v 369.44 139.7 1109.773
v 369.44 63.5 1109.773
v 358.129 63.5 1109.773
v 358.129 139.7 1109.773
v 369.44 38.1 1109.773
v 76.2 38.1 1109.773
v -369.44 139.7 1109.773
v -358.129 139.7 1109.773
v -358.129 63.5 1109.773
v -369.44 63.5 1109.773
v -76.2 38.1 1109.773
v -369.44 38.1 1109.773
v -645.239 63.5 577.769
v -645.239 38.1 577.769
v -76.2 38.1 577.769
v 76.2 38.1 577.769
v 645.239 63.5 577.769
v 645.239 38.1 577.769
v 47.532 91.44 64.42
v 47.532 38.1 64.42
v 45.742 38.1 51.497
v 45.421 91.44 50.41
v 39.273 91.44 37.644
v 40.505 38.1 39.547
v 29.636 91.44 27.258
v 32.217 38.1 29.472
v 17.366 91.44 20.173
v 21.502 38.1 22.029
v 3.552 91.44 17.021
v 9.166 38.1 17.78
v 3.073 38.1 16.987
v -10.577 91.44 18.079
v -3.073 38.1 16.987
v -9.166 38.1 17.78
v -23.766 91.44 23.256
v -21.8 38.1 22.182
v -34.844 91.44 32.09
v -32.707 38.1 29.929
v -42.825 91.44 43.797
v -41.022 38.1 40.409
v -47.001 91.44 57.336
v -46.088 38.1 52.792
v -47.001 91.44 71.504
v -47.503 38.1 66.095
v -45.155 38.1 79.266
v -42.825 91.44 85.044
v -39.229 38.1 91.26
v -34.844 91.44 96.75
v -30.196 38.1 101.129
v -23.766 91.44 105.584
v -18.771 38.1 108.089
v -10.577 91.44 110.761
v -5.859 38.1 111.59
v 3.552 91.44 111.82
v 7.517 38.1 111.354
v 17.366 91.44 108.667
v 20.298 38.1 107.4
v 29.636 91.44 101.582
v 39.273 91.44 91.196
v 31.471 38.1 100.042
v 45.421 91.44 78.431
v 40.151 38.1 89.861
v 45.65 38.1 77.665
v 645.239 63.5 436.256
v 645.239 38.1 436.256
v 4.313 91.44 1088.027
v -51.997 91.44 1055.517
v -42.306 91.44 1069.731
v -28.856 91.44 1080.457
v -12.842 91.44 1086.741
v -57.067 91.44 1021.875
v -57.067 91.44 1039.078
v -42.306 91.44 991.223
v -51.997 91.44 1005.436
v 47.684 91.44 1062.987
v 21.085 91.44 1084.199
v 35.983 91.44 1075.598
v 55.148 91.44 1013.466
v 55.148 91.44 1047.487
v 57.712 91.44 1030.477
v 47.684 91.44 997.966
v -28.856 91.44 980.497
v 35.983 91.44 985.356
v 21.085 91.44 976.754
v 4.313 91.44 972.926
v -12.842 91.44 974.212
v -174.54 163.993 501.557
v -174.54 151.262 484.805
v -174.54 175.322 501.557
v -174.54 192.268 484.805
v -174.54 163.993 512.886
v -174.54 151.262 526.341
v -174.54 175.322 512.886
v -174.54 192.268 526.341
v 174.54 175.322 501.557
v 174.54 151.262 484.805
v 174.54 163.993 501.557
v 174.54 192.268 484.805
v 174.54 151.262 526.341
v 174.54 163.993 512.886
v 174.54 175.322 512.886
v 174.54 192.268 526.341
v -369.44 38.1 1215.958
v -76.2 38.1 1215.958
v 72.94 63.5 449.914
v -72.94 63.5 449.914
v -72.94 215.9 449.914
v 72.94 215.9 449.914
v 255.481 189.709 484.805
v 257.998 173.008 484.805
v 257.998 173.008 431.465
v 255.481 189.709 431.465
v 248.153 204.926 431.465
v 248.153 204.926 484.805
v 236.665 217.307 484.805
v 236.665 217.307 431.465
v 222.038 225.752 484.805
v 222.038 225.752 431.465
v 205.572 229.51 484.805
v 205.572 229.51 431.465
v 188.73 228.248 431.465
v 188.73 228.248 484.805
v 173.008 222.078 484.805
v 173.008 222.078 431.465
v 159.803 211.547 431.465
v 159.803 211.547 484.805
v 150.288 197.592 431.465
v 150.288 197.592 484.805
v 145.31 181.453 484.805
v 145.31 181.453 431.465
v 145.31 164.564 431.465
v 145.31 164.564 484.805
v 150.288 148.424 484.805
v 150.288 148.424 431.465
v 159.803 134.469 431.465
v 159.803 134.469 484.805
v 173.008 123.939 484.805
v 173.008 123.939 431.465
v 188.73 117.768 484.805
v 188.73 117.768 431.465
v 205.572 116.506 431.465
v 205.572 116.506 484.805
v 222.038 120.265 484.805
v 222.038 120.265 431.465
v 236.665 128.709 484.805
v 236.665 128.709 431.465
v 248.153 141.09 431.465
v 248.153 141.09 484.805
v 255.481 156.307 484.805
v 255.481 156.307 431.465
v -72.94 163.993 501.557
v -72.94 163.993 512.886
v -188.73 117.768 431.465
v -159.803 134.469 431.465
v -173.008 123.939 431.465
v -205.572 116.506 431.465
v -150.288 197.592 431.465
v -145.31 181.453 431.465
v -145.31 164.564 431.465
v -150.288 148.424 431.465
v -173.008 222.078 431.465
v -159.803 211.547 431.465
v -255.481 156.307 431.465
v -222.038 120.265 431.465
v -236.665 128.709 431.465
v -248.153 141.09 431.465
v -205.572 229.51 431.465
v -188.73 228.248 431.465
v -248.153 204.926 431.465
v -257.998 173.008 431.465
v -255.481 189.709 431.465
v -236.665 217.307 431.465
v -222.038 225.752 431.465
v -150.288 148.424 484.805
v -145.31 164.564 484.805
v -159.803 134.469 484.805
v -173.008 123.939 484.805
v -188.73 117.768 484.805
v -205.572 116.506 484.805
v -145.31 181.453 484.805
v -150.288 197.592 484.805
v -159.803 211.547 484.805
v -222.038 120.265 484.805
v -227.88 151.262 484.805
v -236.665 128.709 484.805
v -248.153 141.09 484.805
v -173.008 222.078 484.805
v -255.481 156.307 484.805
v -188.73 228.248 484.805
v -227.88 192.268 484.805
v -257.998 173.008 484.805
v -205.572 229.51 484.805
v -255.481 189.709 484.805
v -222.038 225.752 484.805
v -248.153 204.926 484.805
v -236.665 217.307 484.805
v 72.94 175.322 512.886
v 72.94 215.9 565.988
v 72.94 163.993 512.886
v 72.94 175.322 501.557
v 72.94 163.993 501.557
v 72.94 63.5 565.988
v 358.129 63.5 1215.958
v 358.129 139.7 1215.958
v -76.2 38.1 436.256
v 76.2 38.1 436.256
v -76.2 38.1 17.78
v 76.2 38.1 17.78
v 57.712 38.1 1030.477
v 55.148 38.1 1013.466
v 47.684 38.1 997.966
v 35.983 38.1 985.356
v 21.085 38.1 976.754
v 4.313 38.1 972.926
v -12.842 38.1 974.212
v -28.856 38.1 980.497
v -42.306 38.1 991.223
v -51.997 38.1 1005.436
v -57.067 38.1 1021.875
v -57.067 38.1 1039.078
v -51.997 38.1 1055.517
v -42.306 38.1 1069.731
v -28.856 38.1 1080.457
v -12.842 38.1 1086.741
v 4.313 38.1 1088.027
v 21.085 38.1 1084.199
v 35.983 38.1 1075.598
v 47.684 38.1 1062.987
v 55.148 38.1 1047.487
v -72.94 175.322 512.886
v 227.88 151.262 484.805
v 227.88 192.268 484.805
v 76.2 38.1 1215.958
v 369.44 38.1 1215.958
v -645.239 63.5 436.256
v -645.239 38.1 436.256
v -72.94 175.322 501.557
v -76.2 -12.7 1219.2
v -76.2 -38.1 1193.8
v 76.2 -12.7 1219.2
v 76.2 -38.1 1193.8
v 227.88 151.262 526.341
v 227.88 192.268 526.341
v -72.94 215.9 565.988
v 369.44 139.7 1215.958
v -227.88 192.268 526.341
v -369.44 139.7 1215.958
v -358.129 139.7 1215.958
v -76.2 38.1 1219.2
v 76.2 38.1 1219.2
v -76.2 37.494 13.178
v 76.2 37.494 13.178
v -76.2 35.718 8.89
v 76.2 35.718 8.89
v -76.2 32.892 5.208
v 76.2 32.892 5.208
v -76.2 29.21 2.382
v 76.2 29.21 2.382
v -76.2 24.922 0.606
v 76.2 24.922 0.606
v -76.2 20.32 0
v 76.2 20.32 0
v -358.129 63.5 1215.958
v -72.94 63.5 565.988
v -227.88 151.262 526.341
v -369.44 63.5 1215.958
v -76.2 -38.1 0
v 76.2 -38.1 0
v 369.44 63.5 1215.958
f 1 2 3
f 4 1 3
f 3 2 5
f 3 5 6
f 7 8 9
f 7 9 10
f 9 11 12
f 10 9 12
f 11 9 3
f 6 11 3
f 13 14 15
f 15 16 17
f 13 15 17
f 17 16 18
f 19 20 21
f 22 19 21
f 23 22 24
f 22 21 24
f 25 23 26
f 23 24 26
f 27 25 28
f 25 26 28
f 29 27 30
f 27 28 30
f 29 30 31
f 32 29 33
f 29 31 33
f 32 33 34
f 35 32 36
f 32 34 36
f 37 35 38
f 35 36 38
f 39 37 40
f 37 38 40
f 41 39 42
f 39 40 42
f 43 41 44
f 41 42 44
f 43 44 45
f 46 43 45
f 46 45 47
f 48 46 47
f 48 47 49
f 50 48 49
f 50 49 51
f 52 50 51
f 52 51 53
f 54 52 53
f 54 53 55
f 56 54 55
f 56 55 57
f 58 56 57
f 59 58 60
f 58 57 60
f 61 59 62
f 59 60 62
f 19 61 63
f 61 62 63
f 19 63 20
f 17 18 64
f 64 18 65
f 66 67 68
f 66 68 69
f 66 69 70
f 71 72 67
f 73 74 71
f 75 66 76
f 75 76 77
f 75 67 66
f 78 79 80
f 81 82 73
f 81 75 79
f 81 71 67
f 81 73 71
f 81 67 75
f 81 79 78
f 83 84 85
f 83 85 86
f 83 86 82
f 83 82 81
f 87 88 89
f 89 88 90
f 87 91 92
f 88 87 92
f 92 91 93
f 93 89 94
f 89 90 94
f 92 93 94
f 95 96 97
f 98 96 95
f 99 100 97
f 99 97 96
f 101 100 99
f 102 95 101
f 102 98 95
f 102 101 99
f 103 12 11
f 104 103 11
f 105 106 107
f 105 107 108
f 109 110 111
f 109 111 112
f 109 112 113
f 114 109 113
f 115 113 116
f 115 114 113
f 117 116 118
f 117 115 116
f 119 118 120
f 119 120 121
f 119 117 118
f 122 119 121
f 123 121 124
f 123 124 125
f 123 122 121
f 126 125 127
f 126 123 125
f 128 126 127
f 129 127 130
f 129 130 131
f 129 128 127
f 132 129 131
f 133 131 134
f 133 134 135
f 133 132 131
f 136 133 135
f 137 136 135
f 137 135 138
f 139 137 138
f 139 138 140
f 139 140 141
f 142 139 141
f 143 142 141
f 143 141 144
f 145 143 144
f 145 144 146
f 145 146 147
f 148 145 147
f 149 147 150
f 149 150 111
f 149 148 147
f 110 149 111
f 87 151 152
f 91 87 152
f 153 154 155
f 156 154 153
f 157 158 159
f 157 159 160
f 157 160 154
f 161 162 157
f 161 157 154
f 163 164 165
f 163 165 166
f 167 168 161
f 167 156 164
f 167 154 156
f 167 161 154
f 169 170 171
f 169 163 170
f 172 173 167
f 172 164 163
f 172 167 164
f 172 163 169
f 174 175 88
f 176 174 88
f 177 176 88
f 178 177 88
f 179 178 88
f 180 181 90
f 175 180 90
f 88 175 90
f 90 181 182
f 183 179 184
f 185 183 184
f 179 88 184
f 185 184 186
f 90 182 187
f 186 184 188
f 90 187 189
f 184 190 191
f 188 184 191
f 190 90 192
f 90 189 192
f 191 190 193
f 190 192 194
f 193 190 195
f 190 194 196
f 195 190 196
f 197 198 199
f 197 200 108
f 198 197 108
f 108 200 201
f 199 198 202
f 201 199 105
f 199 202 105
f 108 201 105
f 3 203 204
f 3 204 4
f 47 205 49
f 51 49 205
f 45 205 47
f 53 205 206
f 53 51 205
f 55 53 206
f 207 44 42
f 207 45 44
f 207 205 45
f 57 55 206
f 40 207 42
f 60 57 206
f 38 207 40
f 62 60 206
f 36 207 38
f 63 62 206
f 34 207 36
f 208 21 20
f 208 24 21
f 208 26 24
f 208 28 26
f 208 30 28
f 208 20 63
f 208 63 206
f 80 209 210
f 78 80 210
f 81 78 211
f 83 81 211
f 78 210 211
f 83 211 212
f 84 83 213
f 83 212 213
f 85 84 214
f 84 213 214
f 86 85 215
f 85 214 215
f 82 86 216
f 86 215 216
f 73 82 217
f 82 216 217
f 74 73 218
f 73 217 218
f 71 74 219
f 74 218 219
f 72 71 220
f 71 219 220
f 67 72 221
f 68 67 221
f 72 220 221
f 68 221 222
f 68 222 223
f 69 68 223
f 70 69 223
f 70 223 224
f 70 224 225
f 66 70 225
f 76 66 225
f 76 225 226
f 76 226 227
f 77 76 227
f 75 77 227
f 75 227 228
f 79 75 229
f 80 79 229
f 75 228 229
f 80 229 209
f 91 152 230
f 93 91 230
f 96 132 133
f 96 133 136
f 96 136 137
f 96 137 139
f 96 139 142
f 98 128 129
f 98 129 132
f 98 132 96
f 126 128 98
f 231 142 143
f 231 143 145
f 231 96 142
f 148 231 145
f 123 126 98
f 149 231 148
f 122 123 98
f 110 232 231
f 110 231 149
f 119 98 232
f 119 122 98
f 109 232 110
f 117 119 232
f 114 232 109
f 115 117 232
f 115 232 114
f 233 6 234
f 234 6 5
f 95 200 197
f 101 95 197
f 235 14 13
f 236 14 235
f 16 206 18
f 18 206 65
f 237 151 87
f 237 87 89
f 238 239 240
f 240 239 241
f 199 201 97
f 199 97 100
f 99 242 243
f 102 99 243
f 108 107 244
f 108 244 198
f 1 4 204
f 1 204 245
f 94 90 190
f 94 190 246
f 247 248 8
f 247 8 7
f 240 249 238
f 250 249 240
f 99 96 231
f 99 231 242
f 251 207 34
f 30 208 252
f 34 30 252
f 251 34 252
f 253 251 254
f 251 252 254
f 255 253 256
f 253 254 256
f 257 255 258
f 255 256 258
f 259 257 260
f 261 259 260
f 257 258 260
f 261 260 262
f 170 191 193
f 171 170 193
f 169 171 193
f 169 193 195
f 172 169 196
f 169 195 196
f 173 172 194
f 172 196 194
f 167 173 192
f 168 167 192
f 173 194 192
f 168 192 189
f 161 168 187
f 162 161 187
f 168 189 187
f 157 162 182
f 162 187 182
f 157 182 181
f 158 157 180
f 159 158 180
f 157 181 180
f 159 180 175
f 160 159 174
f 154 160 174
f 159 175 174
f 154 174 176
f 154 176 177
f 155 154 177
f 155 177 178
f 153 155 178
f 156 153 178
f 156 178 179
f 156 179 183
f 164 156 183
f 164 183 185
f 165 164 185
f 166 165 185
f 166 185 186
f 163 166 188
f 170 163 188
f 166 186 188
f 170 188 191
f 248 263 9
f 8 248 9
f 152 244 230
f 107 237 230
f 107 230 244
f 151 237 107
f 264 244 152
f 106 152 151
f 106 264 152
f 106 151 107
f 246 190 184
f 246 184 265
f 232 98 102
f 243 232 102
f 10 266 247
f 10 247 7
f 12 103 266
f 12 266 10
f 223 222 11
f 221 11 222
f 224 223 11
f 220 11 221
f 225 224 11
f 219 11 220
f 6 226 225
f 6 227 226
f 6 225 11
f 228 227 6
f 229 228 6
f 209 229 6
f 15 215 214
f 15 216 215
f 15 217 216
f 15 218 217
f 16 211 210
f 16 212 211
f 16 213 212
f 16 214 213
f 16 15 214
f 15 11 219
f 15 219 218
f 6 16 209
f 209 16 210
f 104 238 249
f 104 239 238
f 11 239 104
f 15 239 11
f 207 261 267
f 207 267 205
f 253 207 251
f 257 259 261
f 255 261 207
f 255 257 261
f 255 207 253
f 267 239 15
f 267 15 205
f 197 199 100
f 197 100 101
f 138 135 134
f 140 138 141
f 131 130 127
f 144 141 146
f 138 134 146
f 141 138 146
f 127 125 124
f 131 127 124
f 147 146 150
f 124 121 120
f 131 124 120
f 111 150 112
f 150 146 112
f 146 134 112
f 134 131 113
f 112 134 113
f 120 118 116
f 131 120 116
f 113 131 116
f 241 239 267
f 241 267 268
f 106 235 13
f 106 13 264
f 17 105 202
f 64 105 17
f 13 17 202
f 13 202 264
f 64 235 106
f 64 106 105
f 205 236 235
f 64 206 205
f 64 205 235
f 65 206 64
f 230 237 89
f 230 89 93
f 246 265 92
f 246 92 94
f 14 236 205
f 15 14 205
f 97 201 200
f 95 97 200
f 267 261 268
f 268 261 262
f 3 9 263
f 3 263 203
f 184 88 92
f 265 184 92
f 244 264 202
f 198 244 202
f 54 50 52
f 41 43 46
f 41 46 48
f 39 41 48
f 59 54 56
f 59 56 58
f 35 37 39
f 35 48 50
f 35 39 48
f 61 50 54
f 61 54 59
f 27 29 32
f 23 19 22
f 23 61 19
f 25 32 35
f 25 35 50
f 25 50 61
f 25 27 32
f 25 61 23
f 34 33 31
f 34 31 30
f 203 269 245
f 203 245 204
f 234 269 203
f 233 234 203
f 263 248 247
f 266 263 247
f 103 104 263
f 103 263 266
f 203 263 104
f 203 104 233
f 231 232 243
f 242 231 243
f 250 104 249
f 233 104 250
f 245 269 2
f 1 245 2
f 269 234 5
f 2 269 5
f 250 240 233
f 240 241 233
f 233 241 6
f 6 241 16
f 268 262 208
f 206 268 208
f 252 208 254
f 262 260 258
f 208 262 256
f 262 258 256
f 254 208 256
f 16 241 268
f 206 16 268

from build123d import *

# Parameters (mm, degrees)
SKETCH1_W           = 152.4
SKETCH1_H           = 76.2
BOSS_EXTRUDE1_DEPTH = 1219.2
FILLET1_R           = 17.78
CHAMFER1_SIZE       = 25.4
SKETCH2_W           = 1290.477589614
SKETCH2_H           = 141.513172698
SKETCH2_W_2         = 738.880843562
SKETCH2_H_2         = 106.185211378
BOSS_EXTRUDE2_DEPTH = 25.4
SKETCH3_W           = 145.88030373
SKETCH3_H           = 116.073932347
BOSS_EXTRUDE3_DEPTH = 152.4
SKETCH4_W           = 11.32867816
SKETCH4_H           = 11.32867816
BOSS_EXTRUDE4_DEPTH = 101.6
SKETCH5_W           = 41.535496856
SKETCH5_H           = 41.006382246
BOSS_EXTRUDE5_DEPTH = 53.34
SKETCH6_R           = 56.660477504
BOSS_EXTRUDE6_DEPTH = 53.34
SKETCH7_R           = 47.532369055
SKETCH7_R_2         = 57.711896929
BOSS_EXTRUDE7_DEPTH = 53.34
SKETCH8_W           = 11.310933435
SKETCH8_H           = 106.185211378
BOSS_EXTRUDE8_DEPTH = 76.2


with BuildPart() as part:
    # Sketch1 → Boss-Extrude1 (new body)
    with BuildSketch(Plane.XY):
        Rectangle(SKETCH1_W, SKETCH1_H)
    extrude(amount=BOSS_EXTRUDE1_DEPTH)

    # Fillet1
    fillet1_edges = [part.edges().sort_by_distance(p)[0] for p in [
        (0, 38.1, 0),
    ]]
    fillet(fillet1_edges, radius=FILLET1_R)

    # Chamfer1
    chamfer1_edges = [part.edges().sort_by_distance(p)[0] for p in [
        (0, -38.1, 1219.2),
    ]]
    chamfer(chamfer1_edges, length=CHAMFER1_SIZE)

    # Sketch2 → Boss-Extrude2 (add)
    with BuildSketch(Plane(origin=(0, 38.1, 0), x_dir=(1, 0, 0), z_dir=(0, 1, 0))):
        with Locations((0, -507.012478725)):
            Rectangle(SKETCH2_W, SKETCH2_H)
        with Locations((0, -1162.865725204)):
            Rectangle(SKETCH2_W_2, SKETCH2_H_2)
    extrude(amount=BOSS_EXTRUDE2_DEPTH)

    # Sketch3 → Boss-Extrude3 (add)
    with BuildSketch(Plane(origin=(0, 63.5, 0), x_dir=(1, 0, 0), z_dir=(0, 1, 0))):
        with Locations((0, -507.950753796)):
            Rectangle(SKETCH3_W, SKETCH3_H)
    extrude(amount=BOSS_EXTRUDE3_DEPTH)

    # Sketch4 → Boss-Extrude4 (add)
    with BuildSketch(Plane.ZY.offset(72.940151865)):
        with Locations((507.221293342, 169.657361137)):
            Rectangle(SKETCH4_W, SKETCH4_H)
    boss_extrude4 = extrude(amount=BOSS_EXTRUDE4_DEPTH)

    # Sketch5 → Boss-Extrude5 (add)
    with BuildSketch(Plane.ZY.offset(174.540151865)):
        with Locations((505.573109598, 171.765287406)):
            Rectangle(SKETCH5_W, SKETCH5_H)
    boss_extrude5 = extrude(amount=BOSS_EXTRUDE5_DEPTH)

    # Sketch6 → Boss-Extrude6 (add)
    with BuildSketch(Plane(origin=(0, 0, 484.80536117), x_dir=(-1, 0, 0), z_dir=(0, 0, -1))):
        with Locations((201.337814598, 173.008334857)):
            Circle(SKETCH6_R)
    boss_extrude6 = extrude(amount=BOSS_EXTRUDE6_DEPTH)

    # Mirror1: Boss-Extrude4, Boss-Extrude5, Boss-Extrude6 across plane
    add(boss_extrude4.mirror(Plane(origin=(0, 0, 0), x_dir=(0, 0, 1), z_dir=(1, 0, 0))))
    add(boss_extrude5.mirror(Plane(origin=(0, 0, 0), x_dir=(0, 0, 1), z_dir=(1, 0, 0))))
    add(boss_extrude6.mirror(Plane(origin=(0, 0, 0), x_dir=(0, 0, 1), z_dir=(1, 0, 0))))

    # Sketch7 → Boss-Extrude7 (add)
    with BuildSketch(Plane(origin=(0, 38.1, 0), x_dir=(1, 0, 0), z_dir=(0, 1, 0))):
        with Locations((0, -64.420131153)):
            Circle(SKETCH7_R)
        with Locations((0, -1030.4765592)):
            Circle(SKETCH7_R_2)
    extrude(amount=BOSS_EXTRUDE7_DEPTH)

    # Sketch8 → Boss-Extrude8 (add)
    with BuildSketch(Plane(origin=(0, 63.5, 0), x_dir=(1, 0, 0), z_dir=(0, 1, 0))):
        with Locations((363.784955063, -1162.865725204)):
            Rectangle(SKETCH8_W, SKETCH8_H)
    boss_extrude8 = extrude(amount=BOSS_EXTRUDE8_DEPTH)

    # Mirror2: Boss-Extrude8 across plane
    add(boss_extrude8.mirror(Plane(origin=(0, 0, 0), x_dir=(0, 0, 1), z_dir=(1, 0, 0))))


solid = part.part
